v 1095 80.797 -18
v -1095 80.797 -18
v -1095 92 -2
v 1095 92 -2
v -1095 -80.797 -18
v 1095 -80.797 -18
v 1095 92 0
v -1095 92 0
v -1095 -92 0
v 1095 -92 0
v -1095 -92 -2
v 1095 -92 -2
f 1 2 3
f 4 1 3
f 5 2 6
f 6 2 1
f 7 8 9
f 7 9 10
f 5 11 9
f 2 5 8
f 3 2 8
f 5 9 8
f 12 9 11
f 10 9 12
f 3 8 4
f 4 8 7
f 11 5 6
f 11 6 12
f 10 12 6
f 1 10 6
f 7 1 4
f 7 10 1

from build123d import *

# Parameters (mm, degrees)
SKETCH_1_W             = 2190
SKETCH_1_H             = 184
SM_BASE_FLANGE_1_DEPTH = 18
CUT_EXTRUDE_1_DEPTH    = 2193.005474446


# Sheet-metal steps are written as plain solids
with BuildPart() as part:
    # Sketch 1 → 基体-法兰1 (new body)
    with BuildSketch(Plane.XY):
        Rectangle(SKETCH_1_W, SKETCH_1_H)
    extrude(amount=-SM_BASE_FLANGE_1_DEPTH)

    # 草图6 → 切除-拉伸1 (cut, through all)
    with BuildSketch(Plane.ZY.offset(1095)):
        Polygon((-18, 92), (-18, 80.796679389), (-2, 92), align=None)
        Polygon((-18, -92), (-18, -80.796679389), (-2, -92), align=None)
    extrude(amount=-CUT_EXTRUDE_1_DEPTH, mode=Mode.SUBTRACT)


solid = part.part
